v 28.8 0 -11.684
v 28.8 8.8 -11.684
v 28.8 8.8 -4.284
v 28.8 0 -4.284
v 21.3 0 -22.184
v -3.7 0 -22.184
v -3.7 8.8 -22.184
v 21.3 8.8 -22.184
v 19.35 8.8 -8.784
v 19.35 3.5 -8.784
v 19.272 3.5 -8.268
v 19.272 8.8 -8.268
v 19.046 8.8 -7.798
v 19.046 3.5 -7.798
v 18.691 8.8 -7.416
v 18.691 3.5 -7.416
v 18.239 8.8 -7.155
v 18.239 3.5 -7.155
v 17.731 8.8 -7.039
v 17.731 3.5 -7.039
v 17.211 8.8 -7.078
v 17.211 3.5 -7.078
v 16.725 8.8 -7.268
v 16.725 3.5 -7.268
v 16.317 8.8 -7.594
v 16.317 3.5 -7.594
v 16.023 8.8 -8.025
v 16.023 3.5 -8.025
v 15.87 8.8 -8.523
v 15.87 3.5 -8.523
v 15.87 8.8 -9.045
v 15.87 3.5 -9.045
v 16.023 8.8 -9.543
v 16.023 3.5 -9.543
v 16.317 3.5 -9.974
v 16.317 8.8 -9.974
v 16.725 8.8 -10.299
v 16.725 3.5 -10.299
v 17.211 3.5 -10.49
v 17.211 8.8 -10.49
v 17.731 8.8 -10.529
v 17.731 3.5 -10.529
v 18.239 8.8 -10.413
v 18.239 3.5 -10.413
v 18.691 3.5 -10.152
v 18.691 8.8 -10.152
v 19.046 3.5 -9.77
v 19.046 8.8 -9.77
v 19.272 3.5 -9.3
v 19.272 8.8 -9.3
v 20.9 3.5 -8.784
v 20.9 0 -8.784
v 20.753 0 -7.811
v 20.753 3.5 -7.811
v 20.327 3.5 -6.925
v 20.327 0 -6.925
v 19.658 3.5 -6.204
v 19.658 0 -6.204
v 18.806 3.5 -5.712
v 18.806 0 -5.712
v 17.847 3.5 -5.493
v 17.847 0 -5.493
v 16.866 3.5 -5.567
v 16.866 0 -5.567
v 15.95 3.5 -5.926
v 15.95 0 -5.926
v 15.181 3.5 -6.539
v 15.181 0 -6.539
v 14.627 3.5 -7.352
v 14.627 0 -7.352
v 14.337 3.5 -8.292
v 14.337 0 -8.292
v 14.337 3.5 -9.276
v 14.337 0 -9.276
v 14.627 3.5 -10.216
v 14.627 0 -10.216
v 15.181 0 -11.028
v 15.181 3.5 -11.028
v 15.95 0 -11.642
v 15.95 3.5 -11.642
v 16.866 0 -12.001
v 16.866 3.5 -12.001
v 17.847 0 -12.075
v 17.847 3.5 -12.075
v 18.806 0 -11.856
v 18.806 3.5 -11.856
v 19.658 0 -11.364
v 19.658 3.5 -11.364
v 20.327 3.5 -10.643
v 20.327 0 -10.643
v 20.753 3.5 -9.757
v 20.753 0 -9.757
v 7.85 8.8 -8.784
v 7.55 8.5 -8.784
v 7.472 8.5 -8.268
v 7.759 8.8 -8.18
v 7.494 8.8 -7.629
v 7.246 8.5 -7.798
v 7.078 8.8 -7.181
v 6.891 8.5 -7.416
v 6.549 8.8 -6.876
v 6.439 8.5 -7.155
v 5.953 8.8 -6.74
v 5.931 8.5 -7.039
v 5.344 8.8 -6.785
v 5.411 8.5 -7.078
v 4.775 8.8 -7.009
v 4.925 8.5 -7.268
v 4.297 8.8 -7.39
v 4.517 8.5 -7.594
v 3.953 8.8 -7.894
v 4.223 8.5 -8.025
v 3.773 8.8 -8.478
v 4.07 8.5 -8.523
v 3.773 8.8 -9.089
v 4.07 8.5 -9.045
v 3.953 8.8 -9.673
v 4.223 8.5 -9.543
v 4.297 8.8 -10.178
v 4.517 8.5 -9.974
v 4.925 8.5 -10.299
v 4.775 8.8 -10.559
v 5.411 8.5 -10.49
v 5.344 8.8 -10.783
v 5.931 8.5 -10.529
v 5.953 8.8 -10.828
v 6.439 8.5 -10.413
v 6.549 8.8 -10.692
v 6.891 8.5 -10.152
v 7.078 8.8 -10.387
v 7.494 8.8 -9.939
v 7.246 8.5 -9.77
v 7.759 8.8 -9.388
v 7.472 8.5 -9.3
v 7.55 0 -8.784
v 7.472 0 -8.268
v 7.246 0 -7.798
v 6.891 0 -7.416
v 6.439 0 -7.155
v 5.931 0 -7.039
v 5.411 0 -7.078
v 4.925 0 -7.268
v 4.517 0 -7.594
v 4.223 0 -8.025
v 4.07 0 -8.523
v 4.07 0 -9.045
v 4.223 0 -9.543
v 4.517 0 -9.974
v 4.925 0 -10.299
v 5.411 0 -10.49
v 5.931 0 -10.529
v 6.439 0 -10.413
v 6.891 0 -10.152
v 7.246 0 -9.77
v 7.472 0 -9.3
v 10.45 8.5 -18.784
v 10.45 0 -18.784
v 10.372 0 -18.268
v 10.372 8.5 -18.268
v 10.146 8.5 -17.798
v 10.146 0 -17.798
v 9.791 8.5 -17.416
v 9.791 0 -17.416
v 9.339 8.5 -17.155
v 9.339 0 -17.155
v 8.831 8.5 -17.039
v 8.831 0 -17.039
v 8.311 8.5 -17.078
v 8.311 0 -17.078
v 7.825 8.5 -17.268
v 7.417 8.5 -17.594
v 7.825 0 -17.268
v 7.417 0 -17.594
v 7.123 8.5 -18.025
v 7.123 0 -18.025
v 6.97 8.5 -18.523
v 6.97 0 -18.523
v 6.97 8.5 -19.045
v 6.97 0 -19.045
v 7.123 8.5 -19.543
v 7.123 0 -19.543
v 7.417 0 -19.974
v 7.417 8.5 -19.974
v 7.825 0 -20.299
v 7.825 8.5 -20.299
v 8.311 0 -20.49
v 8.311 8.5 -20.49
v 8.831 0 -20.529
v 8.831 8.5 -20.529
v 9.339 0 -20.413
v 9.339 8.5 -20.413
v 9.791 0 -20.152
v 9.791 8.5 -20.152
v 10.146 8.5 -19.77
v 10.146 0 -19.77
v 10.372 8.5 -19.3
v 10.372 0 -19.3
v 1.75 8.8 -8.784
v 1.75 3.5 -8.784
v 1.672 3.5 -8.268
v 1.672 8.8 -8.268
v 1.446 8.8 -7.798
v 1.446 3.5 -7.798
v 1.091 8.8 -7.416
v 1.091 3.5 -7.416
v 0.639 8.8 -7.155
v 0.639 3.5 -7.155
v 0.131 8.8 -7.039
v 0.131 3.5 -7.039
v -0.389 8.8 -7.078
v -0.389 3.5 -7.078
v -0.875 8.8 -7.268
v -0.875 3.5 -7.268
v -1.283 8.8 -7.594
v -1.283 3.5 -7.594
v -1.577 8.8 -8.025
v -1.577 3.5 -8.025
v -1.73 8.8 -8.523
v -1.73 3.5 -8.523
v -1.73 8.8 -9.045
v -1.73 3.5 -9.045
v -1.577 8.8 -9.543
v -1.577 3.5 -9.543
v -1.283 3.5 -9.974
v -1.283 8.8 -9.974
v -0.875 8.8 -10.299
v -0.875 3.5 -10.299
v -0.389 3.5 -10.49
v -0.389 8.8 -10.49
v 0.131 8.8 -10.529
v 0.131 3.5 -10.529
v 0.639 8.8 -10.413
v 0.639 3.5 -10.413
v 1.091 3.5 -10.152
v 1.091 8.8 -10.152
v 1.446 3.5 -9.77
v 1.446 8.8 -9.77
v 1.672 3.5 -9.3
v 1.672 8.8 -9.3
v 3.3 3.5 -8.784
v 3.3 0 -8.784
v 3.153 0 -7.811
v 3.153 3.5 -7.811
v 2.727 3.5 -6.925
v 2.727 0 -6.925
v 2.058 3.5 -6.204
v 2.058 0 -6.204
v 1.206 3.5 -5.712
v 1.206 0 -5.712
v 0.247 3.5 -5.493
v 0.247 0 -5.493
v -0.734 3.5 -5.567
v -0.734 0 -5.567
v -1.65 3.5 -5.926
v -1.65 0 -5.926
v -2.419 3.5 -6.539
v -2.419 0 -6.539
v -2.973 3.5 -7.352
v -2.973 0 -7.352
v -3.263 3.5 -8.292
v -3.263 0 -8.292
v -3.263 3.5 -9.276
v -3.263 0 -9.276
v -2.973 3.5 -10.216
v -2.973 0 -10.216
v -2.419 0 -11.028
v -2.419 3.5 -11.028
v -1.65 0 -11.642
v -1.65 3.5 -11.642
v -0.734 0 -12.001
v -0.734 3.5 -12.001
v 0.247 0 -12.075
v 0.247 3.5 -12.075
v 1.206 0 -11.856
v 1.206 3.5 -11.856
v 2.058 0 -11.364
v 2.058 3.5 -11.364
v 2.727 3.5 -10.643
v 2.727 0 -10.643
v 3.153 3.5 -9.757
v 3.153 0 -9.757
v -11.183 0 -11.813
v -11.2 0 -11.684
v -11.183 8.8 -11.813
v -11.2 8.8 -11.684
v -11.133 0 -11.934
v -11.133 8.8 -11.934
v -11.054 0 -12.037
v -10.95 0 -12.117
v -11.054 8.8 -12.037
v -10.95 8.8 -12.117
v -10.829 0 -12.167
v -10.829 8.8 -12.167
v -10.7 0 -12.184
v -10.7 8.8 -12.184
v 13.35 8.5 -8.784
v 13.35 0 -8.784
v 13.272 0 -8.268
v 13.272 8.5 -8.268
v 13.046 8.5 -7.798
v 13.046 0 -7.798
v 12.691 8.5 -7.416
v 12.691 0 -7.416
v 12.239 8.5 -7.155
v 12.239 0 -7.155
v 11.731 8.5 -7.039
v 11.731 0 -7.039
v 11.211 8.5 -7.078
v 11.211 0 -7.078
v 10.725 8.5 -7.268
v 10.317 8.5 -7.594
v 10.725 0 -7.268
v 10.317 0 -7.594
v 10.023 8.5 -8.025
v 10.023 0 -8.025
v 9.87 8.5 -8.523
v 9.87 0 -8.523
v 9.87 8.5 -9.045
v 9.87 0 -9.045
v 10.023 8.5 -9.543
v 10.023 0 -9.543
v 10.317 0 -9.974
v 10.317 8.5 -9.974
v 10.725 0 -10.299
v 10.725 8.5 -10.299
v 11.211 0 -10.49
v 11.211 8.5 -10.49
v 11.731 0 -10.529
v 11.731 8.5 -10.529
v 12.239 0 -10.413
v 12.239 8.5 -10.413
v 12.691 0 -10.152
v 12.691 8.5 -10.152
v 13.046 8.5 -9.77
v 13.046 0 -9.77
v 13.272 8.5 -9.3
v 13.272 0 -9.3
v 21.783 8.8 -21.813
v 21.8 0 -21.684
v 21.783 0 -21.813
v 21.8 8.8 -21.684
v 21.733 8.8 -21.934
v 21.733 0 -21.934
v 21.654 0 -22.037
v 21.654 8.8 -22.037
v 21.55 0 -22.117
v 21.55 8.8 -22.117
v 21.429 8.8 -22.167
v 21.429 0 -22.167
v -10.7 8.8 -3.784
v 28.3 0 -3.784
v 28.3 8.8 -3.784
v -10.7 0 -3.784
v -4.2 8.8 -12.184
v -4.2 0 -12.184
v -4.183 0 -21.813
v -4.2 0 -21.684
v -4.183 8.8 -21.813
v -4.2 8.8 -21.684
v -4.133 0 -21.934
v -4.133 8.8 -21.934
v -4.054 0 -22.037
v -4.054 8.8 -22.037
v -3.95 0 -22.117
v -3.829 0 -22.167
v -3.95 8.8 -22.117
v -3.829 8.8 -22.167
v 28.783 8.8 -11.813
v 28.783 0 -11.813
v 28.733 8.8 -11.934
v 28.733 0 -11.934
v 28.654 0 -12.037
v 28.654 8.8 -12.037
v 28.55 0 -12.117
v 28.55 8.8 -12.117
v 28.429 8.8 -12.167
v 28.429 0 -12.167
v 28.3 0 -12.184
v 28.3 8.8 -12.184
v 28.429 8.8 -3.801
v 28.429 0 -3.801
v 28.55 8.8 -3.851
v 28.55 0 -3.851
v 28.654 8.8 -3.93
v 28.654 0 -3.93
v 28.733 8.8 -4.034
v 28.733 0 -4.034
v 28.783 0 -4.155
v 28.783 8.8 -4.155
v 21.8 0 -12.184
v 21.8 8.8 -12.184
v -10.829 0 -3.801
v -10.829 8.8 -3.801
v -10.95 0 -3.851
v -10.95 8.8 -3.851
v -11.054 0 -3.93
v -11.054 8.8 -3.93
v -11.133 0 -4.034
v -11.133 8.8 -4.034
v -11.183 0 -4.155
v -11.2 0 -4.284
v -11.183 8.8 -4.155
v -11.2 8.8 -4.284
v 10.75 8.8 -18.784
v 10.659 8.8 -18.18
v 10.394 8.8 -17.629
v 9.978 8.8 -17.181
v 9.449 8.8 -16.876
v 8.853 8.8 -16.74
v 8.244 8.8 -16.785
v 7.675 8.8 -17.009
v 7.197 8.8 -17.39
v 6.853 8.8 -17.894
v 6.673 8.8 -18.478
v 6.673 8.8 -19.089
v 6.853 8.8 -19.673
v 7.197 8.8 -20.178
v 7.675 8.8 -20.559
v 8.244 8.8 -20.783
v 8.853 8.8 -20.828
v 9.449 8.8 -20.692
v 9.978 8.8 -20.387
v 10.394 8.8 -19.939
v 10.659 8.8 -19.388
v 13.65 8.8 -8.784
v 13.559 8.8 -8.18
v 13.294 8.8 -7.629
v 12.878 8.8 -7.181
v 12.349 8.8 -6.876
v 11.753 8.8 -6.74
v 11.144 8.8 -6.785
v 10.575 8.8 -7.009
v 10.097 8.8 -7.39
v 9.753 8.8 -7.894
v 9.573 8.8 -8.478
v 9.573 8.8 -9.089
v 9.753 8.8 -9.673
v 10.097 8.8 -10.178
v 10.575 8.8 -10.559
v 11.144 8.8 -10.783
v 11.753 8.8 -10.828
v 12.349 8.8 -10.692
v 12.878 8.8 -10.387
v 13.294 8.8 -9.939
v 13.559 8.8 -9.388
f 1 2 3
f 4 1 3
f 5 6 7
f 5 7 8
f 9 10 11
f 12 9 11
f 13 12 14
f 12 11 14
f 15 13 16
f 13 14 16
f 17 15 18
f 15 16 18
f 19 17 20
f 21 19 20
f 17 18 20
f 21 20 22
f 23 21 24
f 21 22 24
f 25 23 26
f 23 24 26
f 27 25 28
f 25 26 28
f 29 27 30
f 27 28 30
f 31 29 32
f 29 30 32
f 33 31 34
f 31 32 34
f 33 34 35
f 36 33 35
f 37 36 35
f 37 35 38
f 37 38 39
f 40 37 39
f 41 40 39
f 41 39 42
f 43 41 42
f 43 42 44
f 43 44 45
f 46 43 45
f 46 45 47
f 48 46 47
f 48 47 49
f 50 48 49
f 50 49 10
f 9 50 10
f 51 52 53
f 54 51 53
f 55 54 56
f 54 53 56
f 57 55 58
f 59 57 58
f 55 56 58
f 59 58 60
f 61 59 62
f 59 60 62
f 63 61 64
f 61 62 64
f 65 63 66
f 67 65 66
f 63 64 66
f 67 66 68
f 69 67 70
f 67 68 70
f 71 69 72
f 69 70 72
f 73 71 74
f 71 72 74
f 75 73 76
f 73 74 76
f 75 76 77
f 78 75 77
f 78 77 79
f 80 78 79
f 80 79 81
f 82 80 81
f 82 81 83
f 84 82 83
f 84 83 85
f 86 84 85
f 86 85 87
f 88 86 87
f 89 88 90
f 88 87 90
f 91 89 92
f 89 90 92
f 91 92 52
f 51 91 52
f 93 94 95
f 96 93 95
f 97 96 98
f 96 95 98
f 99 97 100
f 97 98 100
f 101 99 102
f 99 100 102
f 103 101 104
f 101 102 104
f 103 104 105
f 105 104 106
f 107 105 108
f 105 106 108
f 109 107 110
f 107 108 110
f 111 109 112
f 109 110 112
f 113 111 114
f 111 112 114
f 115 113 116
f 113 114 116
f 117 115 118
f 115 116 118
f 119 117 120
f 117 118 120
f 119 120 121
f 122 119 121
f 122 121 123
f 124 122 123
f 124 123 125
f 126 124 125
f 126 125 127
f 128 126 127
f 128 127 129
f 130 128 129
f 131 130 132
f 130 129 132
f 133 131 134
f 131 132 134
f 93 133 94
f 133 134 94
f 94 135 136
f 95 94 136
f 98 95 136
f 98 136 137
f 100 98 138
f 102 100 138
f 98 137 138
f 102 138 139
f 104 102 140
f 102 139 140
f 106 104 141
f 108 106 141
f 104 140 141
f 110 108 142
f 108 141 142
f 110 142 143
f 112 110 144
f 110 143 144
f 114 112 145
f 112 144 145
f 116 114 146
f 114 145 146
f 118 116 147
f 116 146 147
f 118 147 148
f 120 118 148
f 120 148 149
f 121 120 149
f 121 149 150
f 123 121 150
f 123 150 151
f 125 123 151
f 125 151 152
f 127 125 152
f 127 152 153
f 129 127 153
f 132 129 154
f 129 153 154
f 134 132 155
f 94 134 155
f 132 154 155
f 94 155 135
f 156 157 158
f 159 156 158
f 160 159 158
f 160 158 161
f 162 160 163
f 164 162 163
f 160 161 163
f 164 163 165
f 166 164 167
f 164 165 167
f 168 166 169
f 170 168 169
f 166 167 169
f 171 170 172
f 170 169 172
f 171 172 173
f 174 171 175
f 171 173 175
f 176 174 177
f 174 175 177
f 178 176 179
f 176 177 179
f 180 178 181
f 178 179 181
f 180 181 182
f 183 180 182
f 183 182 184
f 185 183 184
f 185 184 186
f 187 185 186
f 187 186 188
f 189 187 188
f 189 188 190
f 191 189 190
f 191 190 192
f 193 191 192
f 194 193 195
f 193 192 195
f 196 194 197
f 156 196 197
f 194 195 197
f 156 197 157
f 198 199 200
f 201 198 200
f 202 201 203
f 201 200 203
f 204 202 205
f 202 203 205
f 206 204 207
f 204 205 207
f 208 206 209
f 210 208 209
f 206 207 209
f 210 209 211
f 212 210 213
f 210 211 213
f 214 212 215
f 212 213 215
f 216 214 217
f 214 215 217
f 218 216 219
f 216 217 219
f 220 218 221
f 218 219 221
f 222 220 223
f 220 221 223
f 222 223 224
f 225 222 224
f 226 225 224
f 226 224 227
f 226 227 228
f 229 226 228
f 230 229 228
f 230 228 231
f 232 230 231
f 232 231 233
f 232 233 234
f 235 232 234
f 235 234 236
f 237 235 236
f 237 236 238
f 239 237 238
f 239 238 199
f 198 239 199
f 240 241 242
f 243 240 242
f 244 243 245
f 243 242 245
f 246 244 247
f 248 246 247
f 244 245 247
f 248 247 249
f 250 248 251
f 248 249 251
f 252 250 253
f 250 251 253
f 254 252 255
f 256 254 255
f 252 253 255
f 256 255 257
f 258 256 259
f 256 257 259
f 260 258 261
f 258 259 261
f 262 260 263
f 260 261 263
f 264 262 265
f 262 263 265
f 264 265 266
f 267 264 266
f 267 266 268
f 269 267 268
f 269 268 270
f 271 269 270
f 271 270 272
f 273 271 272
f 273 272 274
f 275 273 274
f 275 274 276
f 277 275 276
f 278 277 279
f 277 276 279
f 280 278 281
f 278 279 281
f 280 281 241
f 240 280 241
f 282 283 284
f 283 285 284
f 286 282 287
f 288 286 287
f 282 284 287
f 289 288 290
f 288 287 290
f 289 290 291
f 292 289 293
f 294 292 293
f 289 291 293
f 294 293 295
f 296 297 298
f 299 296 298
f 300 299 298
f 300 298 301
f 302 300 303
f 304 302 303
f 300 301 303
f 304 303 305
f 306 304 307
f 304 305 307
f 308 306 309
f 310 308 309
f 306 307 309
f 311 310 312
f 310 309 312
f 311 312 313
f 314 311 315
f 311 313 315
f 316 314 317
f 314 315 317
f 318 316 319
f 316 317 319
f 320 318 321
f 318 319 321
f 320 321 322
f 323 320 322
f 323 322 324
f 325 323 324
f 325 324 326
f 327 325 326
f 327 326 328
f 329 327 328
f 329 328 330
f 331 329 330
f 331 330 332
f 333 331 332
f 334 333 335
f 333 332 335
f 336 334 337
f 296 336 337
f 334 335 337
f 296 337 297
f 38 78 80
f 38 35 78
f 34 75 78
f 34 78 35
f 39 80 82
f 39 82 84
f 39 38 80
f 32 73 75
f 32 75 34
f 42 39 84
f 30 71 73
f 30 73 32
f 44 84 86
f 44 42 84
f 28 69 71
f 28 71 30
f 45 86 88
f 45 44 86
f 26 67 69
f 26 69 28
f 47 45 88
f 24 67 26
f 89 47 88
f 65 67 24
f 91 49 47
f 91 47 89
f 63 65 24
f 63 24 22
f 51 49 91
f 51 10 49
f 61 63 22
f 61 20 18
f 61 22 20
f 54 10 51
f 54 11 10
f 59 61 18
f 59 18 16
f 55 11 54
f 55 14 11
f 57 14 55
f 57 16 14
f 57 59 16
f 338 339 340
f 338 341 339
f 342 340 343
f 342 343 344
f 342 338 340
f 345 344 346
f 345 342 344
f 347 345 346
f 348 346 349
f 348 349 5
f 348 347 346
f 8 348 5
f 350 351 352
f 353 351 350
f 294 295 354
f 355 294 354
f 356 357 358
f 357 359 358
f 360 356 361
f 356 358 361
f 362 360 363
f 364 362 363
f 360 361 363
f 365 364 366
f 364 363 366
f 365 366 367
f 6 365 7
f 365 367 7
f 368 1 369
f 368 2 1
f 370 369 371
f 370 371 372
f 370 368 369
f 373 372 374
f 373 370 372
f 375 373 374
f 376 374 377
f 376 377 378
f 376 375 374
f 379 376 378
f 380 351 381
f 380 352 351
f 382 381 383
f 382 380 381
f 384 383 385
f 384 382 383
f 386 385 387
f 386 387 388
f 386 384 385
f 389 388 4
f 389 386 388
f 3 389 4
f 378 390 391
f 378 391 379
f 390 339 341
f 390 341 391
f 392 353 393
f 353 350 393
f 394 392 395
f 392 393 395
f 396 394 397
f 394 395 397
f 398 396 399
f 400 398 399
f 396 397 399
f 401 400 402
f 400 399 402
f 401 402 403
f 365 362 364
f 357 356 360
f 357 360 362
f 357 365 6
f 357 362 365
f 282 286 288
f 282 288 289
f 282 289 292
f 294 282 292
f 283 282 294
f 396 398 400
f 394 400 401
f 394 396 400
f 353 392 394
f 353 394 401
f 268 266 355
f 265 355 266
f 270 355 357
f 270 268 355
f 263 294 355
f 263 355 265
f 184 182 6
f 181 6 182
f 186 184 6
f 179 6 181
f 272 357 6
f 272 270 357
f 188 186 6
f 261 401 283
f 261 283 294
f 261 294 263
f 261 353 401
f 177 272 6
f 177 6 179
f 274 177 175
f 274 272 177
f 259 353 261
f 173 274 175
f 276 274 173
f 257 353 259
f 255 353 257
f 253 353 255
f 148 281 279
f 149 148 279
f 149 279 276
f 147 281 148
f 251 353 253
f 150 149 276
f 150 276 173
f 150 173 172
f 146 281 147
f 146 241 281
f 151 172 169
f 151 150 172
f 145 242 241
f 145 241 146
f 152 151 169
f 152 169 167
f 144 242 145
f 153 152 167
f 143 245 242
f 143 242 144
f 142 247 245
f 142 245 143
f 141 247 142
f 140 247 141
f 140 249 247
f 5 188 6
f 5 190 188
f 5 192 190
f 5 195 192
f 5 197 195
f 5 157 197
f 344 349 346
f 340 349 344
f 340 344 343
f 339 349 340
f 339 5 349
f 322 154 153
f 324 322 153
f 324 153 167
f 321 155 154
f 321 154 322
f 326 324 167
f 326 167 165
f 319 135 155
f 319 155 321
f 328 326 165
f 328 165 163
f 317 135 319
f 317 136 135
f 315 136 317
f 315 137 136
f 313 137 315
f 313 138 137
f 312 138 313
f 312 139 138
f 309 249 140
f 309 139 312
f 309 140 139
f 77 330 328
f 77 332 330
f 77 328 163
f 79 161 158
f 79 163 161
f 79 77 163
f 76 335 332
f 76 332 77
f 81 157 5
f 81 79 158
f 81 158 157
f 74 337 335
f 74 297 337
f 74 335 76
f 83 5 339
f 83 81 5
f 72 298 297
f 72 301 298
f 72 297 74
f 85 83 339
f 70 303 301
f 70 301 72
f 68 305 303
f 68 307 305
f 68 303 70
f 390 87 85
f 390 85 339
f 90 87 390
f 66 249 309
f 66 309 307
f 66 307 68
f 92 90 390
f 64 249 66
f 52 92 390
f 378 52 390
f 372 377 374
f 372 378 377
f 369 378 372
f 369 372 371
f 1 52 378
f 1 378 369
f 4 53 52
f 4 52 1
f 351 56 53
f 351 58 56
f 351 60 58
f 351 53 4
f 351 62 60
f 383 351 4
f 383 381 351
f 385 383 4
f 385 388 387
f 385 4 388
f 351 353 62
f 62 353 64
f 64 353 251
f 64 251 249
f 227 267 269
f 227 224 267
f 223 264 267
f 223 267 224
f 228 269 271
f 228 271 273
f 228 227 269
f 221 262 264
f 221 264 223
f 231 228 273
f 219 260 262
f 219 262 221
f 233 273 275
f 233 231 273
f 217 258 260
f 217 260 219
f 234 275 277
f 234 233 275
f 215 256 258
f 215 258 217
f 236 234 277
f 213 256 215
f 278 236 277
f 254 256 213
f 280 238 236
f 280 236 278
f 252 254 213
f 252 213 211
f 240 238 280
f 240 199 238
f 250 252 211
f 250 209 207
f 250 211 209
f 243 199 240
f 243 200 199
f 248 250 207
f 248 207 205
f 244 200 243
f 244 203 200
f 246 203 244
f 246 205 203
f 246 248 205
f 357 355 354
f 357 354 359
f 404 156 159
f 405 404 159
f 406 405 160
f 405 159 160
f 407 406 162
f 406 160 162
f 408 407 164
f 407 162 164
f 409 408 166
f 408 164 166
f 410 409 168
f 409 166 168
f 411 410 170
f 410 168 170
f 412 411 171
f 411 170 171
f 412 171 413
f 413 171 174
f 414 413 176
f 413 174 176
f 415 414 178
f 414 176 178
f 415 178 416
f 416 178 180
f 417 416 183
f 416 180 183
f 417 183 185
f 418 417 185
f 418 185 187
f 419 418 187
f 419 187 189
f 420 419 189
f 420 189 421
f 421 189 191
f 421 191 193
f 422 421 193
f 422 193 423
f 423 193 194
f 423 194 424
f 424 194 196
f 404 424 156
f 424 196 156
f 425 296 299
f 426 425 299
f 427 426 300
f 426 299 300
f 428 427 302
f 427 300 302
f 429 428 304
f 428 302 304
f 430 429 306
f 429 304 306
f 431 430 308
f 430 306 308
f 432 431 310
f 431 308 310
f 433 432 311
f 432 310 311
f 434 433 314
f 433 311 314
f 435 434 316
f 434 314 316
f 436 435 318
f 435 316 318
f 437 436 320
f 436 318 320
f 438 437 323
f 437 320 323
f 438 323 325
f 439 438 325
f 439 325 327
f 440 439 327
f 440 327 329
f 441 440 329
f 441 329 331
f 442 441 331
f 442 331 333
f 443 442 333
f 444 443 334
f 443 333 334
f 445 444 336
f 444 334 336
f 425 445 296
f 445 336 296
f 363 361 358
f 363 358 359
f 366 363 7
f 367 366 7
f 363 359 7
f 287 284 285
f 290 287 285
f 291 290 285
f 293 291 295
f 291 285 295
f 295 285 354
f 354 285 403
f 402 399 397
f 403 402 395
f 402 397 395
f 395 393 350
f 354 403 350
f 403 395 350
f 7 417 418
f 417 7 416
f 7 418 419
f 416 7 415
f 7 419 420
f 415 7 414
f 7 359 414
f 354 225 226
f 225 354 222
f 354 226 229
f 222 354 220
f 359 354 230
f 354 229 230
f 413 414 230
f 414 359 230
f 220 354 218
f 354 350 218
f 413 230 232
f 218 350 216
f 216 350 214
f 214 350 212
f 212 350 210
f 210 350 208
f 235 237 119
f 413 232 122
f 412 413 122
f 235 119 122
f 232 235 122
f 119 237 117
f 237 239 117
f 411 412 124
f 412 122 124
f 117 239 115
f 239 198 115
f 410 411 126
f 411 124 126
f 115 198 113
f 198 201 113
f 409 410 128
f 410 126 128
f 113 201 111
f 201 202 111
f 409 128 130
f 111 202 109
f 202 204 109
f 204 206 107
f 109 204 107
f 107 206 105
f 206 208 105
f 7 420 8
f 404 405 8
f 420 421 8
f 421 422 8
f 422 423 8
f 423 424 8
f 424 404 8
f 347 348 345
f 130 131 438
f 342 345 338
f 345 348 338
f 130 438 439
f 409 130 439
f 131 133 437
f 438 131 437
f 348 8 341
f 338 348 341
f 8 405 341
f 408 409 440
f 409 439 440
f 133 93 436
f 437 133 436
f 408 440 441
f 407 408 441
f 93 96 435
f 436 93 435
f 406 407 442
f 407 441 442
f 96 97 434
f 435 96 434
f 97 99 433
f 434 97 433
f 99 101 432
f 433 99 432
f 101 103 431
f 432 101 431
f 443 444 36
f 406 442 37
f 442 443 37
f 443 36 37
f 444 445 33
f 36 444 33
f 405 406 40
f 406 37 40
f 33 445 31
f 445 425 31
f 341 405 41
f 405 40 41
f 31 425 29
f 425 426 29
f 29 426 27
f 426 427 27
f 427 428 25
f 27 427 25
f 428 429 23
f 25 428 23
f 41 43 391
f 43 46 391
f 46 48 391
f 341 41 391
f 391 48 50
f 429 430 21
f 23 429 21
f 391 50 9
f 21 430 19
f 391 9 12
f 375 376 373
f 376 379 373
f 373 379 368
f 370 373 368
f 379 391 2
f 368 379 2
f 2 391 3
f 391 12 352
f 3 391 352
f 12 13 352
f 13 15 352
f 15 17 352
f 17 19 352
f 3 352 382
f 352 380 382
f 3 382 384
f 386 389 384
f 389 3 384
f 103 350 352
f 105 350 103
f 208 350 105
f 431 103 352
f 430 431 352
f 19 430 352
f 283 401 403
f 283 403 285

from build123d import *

# Parameters (mm, degrees)
F0_R     = 1.95
F0_R_2   = 3.3
F0_R_3   = 1.75
F1_DEPTH = 8.8
F2_DEPTH = 3.5
F3_DEPTH = 3.5
F4_SIZE  = 0.3
F5_R     = 0.5


with BuildPart() as f1:
    # F0 (on Front) → F1 (new body)
    with BuildSketch(Plane.XZ):
        Polygon((28.8, -3.783914), (-11.2, -3.783914), (-11.2, -12.183914), (-4.2, -12.183914), (-4.2, -22.183914), (21.8, -22.183914), (21.8, -12.183914), (28.8, -12.183914), align=None)
        with Locations((8.7, -18.783914)):
            Circle(F0_R, mode=Mode.SUBTRACT)
        with Locations((0, -8.783914)):
            Circle(F0_R_2, mode=Mode.SUBTRACT)
        with Locations((5.8, -8.783914)):
            Circle(F0_R, mode=Mode.SUBTRACT)
        with Locations((11.6, -8.783914)):
            Circle(F0_R, mode=Mode.SUBTRACT)
        with Locations((17.6, -8.783914)):
            Circle(F0_R_2, mode=Mode.SUBTRACT)
        with Locations((0, -8.783914)):
            Circle(F0_R_2)
        with Locations((0, -8.783914)):
            Circle(F0_R_3, mode=Mode.SUBTRACT)
        with Locations((17.6, -8.783914)):
            Circle(F0_R_2)
        with Locations((17.6, -8.783914)):
            Circle(F0_R_3, mode=Mode.SUBTRACT)
        with Locations((11.6, -8.783914)):
            Circle(F0_R)
        with Locations((11.6, -8.783914)):
            Circle(F0_R_3, mode=Mode.SUBTRACT)
        with Locations((5.8, -8.783914)):
            Circle(F0_R)
        with Locations((5.8, -8.783914)):
            Circle(F0_R_3, mode=Mode.SUBTRACT)
        with Locations((8.7, -18.783914)):
            Circle(F0_R)
        with Locations((8.7, -18.783914)):
            Circle(F0_R_3, mode=Mode.SUBTRACT)
    extrude(amount=-F1_DEPTH)

    # F0 (on Front) → F2 (cut)
    with BuildSketch(Plane.XZ):
        with Locations((17.6, -8.783914)):
            Circle(F0_R_2)
        with Locations((17.6, -8.783914)):
            Circle(F0_R_3, mode=Mode.SUBTRACT)
    extrude(amount=-F2_DEPTH, mode=Mode.SUBTRACT)

    # F0 (on Front) → F3 (cut)
    with BuildSketch(Plane.XZ):
        with Locations((0, -8.783914)):
            Circle(F0_R_2)
        with Locations((0, -8.783914)):
            Circle(F0_R_3, mode=Mode.SUBTRACT)
    extrude(amount=-F3_DEPTH, mode=Mode.SUBTRACT)

    # F4
    f4_edges = [f1.edges().sort_by_distance(p)[0] for p in [
        (9.85, 8.8, -8.783914),
        (4.05, 8.8, -8.783914),
        (6.95, 8.8, -18.783914),
    ]]
    chamfer(f4_edges, length=F4_SIZE)

    # F5
    f5_edges = [f1.edges().sort_by_distance(p)[0] for p in [
        (-11.2, 4.4, -3.783914),
        (-11.2, 4.4, -12.183914),
        (-4.2, 4.4, -22.183914),
        (28.8, 4.4, -12.183914),
        (28.8, 4.4, -3.783914),
        (21.8, 4.4, -22.183914),
    ]]
    fillet(f5_edges, radius=F5_R)


solid = f1.part
